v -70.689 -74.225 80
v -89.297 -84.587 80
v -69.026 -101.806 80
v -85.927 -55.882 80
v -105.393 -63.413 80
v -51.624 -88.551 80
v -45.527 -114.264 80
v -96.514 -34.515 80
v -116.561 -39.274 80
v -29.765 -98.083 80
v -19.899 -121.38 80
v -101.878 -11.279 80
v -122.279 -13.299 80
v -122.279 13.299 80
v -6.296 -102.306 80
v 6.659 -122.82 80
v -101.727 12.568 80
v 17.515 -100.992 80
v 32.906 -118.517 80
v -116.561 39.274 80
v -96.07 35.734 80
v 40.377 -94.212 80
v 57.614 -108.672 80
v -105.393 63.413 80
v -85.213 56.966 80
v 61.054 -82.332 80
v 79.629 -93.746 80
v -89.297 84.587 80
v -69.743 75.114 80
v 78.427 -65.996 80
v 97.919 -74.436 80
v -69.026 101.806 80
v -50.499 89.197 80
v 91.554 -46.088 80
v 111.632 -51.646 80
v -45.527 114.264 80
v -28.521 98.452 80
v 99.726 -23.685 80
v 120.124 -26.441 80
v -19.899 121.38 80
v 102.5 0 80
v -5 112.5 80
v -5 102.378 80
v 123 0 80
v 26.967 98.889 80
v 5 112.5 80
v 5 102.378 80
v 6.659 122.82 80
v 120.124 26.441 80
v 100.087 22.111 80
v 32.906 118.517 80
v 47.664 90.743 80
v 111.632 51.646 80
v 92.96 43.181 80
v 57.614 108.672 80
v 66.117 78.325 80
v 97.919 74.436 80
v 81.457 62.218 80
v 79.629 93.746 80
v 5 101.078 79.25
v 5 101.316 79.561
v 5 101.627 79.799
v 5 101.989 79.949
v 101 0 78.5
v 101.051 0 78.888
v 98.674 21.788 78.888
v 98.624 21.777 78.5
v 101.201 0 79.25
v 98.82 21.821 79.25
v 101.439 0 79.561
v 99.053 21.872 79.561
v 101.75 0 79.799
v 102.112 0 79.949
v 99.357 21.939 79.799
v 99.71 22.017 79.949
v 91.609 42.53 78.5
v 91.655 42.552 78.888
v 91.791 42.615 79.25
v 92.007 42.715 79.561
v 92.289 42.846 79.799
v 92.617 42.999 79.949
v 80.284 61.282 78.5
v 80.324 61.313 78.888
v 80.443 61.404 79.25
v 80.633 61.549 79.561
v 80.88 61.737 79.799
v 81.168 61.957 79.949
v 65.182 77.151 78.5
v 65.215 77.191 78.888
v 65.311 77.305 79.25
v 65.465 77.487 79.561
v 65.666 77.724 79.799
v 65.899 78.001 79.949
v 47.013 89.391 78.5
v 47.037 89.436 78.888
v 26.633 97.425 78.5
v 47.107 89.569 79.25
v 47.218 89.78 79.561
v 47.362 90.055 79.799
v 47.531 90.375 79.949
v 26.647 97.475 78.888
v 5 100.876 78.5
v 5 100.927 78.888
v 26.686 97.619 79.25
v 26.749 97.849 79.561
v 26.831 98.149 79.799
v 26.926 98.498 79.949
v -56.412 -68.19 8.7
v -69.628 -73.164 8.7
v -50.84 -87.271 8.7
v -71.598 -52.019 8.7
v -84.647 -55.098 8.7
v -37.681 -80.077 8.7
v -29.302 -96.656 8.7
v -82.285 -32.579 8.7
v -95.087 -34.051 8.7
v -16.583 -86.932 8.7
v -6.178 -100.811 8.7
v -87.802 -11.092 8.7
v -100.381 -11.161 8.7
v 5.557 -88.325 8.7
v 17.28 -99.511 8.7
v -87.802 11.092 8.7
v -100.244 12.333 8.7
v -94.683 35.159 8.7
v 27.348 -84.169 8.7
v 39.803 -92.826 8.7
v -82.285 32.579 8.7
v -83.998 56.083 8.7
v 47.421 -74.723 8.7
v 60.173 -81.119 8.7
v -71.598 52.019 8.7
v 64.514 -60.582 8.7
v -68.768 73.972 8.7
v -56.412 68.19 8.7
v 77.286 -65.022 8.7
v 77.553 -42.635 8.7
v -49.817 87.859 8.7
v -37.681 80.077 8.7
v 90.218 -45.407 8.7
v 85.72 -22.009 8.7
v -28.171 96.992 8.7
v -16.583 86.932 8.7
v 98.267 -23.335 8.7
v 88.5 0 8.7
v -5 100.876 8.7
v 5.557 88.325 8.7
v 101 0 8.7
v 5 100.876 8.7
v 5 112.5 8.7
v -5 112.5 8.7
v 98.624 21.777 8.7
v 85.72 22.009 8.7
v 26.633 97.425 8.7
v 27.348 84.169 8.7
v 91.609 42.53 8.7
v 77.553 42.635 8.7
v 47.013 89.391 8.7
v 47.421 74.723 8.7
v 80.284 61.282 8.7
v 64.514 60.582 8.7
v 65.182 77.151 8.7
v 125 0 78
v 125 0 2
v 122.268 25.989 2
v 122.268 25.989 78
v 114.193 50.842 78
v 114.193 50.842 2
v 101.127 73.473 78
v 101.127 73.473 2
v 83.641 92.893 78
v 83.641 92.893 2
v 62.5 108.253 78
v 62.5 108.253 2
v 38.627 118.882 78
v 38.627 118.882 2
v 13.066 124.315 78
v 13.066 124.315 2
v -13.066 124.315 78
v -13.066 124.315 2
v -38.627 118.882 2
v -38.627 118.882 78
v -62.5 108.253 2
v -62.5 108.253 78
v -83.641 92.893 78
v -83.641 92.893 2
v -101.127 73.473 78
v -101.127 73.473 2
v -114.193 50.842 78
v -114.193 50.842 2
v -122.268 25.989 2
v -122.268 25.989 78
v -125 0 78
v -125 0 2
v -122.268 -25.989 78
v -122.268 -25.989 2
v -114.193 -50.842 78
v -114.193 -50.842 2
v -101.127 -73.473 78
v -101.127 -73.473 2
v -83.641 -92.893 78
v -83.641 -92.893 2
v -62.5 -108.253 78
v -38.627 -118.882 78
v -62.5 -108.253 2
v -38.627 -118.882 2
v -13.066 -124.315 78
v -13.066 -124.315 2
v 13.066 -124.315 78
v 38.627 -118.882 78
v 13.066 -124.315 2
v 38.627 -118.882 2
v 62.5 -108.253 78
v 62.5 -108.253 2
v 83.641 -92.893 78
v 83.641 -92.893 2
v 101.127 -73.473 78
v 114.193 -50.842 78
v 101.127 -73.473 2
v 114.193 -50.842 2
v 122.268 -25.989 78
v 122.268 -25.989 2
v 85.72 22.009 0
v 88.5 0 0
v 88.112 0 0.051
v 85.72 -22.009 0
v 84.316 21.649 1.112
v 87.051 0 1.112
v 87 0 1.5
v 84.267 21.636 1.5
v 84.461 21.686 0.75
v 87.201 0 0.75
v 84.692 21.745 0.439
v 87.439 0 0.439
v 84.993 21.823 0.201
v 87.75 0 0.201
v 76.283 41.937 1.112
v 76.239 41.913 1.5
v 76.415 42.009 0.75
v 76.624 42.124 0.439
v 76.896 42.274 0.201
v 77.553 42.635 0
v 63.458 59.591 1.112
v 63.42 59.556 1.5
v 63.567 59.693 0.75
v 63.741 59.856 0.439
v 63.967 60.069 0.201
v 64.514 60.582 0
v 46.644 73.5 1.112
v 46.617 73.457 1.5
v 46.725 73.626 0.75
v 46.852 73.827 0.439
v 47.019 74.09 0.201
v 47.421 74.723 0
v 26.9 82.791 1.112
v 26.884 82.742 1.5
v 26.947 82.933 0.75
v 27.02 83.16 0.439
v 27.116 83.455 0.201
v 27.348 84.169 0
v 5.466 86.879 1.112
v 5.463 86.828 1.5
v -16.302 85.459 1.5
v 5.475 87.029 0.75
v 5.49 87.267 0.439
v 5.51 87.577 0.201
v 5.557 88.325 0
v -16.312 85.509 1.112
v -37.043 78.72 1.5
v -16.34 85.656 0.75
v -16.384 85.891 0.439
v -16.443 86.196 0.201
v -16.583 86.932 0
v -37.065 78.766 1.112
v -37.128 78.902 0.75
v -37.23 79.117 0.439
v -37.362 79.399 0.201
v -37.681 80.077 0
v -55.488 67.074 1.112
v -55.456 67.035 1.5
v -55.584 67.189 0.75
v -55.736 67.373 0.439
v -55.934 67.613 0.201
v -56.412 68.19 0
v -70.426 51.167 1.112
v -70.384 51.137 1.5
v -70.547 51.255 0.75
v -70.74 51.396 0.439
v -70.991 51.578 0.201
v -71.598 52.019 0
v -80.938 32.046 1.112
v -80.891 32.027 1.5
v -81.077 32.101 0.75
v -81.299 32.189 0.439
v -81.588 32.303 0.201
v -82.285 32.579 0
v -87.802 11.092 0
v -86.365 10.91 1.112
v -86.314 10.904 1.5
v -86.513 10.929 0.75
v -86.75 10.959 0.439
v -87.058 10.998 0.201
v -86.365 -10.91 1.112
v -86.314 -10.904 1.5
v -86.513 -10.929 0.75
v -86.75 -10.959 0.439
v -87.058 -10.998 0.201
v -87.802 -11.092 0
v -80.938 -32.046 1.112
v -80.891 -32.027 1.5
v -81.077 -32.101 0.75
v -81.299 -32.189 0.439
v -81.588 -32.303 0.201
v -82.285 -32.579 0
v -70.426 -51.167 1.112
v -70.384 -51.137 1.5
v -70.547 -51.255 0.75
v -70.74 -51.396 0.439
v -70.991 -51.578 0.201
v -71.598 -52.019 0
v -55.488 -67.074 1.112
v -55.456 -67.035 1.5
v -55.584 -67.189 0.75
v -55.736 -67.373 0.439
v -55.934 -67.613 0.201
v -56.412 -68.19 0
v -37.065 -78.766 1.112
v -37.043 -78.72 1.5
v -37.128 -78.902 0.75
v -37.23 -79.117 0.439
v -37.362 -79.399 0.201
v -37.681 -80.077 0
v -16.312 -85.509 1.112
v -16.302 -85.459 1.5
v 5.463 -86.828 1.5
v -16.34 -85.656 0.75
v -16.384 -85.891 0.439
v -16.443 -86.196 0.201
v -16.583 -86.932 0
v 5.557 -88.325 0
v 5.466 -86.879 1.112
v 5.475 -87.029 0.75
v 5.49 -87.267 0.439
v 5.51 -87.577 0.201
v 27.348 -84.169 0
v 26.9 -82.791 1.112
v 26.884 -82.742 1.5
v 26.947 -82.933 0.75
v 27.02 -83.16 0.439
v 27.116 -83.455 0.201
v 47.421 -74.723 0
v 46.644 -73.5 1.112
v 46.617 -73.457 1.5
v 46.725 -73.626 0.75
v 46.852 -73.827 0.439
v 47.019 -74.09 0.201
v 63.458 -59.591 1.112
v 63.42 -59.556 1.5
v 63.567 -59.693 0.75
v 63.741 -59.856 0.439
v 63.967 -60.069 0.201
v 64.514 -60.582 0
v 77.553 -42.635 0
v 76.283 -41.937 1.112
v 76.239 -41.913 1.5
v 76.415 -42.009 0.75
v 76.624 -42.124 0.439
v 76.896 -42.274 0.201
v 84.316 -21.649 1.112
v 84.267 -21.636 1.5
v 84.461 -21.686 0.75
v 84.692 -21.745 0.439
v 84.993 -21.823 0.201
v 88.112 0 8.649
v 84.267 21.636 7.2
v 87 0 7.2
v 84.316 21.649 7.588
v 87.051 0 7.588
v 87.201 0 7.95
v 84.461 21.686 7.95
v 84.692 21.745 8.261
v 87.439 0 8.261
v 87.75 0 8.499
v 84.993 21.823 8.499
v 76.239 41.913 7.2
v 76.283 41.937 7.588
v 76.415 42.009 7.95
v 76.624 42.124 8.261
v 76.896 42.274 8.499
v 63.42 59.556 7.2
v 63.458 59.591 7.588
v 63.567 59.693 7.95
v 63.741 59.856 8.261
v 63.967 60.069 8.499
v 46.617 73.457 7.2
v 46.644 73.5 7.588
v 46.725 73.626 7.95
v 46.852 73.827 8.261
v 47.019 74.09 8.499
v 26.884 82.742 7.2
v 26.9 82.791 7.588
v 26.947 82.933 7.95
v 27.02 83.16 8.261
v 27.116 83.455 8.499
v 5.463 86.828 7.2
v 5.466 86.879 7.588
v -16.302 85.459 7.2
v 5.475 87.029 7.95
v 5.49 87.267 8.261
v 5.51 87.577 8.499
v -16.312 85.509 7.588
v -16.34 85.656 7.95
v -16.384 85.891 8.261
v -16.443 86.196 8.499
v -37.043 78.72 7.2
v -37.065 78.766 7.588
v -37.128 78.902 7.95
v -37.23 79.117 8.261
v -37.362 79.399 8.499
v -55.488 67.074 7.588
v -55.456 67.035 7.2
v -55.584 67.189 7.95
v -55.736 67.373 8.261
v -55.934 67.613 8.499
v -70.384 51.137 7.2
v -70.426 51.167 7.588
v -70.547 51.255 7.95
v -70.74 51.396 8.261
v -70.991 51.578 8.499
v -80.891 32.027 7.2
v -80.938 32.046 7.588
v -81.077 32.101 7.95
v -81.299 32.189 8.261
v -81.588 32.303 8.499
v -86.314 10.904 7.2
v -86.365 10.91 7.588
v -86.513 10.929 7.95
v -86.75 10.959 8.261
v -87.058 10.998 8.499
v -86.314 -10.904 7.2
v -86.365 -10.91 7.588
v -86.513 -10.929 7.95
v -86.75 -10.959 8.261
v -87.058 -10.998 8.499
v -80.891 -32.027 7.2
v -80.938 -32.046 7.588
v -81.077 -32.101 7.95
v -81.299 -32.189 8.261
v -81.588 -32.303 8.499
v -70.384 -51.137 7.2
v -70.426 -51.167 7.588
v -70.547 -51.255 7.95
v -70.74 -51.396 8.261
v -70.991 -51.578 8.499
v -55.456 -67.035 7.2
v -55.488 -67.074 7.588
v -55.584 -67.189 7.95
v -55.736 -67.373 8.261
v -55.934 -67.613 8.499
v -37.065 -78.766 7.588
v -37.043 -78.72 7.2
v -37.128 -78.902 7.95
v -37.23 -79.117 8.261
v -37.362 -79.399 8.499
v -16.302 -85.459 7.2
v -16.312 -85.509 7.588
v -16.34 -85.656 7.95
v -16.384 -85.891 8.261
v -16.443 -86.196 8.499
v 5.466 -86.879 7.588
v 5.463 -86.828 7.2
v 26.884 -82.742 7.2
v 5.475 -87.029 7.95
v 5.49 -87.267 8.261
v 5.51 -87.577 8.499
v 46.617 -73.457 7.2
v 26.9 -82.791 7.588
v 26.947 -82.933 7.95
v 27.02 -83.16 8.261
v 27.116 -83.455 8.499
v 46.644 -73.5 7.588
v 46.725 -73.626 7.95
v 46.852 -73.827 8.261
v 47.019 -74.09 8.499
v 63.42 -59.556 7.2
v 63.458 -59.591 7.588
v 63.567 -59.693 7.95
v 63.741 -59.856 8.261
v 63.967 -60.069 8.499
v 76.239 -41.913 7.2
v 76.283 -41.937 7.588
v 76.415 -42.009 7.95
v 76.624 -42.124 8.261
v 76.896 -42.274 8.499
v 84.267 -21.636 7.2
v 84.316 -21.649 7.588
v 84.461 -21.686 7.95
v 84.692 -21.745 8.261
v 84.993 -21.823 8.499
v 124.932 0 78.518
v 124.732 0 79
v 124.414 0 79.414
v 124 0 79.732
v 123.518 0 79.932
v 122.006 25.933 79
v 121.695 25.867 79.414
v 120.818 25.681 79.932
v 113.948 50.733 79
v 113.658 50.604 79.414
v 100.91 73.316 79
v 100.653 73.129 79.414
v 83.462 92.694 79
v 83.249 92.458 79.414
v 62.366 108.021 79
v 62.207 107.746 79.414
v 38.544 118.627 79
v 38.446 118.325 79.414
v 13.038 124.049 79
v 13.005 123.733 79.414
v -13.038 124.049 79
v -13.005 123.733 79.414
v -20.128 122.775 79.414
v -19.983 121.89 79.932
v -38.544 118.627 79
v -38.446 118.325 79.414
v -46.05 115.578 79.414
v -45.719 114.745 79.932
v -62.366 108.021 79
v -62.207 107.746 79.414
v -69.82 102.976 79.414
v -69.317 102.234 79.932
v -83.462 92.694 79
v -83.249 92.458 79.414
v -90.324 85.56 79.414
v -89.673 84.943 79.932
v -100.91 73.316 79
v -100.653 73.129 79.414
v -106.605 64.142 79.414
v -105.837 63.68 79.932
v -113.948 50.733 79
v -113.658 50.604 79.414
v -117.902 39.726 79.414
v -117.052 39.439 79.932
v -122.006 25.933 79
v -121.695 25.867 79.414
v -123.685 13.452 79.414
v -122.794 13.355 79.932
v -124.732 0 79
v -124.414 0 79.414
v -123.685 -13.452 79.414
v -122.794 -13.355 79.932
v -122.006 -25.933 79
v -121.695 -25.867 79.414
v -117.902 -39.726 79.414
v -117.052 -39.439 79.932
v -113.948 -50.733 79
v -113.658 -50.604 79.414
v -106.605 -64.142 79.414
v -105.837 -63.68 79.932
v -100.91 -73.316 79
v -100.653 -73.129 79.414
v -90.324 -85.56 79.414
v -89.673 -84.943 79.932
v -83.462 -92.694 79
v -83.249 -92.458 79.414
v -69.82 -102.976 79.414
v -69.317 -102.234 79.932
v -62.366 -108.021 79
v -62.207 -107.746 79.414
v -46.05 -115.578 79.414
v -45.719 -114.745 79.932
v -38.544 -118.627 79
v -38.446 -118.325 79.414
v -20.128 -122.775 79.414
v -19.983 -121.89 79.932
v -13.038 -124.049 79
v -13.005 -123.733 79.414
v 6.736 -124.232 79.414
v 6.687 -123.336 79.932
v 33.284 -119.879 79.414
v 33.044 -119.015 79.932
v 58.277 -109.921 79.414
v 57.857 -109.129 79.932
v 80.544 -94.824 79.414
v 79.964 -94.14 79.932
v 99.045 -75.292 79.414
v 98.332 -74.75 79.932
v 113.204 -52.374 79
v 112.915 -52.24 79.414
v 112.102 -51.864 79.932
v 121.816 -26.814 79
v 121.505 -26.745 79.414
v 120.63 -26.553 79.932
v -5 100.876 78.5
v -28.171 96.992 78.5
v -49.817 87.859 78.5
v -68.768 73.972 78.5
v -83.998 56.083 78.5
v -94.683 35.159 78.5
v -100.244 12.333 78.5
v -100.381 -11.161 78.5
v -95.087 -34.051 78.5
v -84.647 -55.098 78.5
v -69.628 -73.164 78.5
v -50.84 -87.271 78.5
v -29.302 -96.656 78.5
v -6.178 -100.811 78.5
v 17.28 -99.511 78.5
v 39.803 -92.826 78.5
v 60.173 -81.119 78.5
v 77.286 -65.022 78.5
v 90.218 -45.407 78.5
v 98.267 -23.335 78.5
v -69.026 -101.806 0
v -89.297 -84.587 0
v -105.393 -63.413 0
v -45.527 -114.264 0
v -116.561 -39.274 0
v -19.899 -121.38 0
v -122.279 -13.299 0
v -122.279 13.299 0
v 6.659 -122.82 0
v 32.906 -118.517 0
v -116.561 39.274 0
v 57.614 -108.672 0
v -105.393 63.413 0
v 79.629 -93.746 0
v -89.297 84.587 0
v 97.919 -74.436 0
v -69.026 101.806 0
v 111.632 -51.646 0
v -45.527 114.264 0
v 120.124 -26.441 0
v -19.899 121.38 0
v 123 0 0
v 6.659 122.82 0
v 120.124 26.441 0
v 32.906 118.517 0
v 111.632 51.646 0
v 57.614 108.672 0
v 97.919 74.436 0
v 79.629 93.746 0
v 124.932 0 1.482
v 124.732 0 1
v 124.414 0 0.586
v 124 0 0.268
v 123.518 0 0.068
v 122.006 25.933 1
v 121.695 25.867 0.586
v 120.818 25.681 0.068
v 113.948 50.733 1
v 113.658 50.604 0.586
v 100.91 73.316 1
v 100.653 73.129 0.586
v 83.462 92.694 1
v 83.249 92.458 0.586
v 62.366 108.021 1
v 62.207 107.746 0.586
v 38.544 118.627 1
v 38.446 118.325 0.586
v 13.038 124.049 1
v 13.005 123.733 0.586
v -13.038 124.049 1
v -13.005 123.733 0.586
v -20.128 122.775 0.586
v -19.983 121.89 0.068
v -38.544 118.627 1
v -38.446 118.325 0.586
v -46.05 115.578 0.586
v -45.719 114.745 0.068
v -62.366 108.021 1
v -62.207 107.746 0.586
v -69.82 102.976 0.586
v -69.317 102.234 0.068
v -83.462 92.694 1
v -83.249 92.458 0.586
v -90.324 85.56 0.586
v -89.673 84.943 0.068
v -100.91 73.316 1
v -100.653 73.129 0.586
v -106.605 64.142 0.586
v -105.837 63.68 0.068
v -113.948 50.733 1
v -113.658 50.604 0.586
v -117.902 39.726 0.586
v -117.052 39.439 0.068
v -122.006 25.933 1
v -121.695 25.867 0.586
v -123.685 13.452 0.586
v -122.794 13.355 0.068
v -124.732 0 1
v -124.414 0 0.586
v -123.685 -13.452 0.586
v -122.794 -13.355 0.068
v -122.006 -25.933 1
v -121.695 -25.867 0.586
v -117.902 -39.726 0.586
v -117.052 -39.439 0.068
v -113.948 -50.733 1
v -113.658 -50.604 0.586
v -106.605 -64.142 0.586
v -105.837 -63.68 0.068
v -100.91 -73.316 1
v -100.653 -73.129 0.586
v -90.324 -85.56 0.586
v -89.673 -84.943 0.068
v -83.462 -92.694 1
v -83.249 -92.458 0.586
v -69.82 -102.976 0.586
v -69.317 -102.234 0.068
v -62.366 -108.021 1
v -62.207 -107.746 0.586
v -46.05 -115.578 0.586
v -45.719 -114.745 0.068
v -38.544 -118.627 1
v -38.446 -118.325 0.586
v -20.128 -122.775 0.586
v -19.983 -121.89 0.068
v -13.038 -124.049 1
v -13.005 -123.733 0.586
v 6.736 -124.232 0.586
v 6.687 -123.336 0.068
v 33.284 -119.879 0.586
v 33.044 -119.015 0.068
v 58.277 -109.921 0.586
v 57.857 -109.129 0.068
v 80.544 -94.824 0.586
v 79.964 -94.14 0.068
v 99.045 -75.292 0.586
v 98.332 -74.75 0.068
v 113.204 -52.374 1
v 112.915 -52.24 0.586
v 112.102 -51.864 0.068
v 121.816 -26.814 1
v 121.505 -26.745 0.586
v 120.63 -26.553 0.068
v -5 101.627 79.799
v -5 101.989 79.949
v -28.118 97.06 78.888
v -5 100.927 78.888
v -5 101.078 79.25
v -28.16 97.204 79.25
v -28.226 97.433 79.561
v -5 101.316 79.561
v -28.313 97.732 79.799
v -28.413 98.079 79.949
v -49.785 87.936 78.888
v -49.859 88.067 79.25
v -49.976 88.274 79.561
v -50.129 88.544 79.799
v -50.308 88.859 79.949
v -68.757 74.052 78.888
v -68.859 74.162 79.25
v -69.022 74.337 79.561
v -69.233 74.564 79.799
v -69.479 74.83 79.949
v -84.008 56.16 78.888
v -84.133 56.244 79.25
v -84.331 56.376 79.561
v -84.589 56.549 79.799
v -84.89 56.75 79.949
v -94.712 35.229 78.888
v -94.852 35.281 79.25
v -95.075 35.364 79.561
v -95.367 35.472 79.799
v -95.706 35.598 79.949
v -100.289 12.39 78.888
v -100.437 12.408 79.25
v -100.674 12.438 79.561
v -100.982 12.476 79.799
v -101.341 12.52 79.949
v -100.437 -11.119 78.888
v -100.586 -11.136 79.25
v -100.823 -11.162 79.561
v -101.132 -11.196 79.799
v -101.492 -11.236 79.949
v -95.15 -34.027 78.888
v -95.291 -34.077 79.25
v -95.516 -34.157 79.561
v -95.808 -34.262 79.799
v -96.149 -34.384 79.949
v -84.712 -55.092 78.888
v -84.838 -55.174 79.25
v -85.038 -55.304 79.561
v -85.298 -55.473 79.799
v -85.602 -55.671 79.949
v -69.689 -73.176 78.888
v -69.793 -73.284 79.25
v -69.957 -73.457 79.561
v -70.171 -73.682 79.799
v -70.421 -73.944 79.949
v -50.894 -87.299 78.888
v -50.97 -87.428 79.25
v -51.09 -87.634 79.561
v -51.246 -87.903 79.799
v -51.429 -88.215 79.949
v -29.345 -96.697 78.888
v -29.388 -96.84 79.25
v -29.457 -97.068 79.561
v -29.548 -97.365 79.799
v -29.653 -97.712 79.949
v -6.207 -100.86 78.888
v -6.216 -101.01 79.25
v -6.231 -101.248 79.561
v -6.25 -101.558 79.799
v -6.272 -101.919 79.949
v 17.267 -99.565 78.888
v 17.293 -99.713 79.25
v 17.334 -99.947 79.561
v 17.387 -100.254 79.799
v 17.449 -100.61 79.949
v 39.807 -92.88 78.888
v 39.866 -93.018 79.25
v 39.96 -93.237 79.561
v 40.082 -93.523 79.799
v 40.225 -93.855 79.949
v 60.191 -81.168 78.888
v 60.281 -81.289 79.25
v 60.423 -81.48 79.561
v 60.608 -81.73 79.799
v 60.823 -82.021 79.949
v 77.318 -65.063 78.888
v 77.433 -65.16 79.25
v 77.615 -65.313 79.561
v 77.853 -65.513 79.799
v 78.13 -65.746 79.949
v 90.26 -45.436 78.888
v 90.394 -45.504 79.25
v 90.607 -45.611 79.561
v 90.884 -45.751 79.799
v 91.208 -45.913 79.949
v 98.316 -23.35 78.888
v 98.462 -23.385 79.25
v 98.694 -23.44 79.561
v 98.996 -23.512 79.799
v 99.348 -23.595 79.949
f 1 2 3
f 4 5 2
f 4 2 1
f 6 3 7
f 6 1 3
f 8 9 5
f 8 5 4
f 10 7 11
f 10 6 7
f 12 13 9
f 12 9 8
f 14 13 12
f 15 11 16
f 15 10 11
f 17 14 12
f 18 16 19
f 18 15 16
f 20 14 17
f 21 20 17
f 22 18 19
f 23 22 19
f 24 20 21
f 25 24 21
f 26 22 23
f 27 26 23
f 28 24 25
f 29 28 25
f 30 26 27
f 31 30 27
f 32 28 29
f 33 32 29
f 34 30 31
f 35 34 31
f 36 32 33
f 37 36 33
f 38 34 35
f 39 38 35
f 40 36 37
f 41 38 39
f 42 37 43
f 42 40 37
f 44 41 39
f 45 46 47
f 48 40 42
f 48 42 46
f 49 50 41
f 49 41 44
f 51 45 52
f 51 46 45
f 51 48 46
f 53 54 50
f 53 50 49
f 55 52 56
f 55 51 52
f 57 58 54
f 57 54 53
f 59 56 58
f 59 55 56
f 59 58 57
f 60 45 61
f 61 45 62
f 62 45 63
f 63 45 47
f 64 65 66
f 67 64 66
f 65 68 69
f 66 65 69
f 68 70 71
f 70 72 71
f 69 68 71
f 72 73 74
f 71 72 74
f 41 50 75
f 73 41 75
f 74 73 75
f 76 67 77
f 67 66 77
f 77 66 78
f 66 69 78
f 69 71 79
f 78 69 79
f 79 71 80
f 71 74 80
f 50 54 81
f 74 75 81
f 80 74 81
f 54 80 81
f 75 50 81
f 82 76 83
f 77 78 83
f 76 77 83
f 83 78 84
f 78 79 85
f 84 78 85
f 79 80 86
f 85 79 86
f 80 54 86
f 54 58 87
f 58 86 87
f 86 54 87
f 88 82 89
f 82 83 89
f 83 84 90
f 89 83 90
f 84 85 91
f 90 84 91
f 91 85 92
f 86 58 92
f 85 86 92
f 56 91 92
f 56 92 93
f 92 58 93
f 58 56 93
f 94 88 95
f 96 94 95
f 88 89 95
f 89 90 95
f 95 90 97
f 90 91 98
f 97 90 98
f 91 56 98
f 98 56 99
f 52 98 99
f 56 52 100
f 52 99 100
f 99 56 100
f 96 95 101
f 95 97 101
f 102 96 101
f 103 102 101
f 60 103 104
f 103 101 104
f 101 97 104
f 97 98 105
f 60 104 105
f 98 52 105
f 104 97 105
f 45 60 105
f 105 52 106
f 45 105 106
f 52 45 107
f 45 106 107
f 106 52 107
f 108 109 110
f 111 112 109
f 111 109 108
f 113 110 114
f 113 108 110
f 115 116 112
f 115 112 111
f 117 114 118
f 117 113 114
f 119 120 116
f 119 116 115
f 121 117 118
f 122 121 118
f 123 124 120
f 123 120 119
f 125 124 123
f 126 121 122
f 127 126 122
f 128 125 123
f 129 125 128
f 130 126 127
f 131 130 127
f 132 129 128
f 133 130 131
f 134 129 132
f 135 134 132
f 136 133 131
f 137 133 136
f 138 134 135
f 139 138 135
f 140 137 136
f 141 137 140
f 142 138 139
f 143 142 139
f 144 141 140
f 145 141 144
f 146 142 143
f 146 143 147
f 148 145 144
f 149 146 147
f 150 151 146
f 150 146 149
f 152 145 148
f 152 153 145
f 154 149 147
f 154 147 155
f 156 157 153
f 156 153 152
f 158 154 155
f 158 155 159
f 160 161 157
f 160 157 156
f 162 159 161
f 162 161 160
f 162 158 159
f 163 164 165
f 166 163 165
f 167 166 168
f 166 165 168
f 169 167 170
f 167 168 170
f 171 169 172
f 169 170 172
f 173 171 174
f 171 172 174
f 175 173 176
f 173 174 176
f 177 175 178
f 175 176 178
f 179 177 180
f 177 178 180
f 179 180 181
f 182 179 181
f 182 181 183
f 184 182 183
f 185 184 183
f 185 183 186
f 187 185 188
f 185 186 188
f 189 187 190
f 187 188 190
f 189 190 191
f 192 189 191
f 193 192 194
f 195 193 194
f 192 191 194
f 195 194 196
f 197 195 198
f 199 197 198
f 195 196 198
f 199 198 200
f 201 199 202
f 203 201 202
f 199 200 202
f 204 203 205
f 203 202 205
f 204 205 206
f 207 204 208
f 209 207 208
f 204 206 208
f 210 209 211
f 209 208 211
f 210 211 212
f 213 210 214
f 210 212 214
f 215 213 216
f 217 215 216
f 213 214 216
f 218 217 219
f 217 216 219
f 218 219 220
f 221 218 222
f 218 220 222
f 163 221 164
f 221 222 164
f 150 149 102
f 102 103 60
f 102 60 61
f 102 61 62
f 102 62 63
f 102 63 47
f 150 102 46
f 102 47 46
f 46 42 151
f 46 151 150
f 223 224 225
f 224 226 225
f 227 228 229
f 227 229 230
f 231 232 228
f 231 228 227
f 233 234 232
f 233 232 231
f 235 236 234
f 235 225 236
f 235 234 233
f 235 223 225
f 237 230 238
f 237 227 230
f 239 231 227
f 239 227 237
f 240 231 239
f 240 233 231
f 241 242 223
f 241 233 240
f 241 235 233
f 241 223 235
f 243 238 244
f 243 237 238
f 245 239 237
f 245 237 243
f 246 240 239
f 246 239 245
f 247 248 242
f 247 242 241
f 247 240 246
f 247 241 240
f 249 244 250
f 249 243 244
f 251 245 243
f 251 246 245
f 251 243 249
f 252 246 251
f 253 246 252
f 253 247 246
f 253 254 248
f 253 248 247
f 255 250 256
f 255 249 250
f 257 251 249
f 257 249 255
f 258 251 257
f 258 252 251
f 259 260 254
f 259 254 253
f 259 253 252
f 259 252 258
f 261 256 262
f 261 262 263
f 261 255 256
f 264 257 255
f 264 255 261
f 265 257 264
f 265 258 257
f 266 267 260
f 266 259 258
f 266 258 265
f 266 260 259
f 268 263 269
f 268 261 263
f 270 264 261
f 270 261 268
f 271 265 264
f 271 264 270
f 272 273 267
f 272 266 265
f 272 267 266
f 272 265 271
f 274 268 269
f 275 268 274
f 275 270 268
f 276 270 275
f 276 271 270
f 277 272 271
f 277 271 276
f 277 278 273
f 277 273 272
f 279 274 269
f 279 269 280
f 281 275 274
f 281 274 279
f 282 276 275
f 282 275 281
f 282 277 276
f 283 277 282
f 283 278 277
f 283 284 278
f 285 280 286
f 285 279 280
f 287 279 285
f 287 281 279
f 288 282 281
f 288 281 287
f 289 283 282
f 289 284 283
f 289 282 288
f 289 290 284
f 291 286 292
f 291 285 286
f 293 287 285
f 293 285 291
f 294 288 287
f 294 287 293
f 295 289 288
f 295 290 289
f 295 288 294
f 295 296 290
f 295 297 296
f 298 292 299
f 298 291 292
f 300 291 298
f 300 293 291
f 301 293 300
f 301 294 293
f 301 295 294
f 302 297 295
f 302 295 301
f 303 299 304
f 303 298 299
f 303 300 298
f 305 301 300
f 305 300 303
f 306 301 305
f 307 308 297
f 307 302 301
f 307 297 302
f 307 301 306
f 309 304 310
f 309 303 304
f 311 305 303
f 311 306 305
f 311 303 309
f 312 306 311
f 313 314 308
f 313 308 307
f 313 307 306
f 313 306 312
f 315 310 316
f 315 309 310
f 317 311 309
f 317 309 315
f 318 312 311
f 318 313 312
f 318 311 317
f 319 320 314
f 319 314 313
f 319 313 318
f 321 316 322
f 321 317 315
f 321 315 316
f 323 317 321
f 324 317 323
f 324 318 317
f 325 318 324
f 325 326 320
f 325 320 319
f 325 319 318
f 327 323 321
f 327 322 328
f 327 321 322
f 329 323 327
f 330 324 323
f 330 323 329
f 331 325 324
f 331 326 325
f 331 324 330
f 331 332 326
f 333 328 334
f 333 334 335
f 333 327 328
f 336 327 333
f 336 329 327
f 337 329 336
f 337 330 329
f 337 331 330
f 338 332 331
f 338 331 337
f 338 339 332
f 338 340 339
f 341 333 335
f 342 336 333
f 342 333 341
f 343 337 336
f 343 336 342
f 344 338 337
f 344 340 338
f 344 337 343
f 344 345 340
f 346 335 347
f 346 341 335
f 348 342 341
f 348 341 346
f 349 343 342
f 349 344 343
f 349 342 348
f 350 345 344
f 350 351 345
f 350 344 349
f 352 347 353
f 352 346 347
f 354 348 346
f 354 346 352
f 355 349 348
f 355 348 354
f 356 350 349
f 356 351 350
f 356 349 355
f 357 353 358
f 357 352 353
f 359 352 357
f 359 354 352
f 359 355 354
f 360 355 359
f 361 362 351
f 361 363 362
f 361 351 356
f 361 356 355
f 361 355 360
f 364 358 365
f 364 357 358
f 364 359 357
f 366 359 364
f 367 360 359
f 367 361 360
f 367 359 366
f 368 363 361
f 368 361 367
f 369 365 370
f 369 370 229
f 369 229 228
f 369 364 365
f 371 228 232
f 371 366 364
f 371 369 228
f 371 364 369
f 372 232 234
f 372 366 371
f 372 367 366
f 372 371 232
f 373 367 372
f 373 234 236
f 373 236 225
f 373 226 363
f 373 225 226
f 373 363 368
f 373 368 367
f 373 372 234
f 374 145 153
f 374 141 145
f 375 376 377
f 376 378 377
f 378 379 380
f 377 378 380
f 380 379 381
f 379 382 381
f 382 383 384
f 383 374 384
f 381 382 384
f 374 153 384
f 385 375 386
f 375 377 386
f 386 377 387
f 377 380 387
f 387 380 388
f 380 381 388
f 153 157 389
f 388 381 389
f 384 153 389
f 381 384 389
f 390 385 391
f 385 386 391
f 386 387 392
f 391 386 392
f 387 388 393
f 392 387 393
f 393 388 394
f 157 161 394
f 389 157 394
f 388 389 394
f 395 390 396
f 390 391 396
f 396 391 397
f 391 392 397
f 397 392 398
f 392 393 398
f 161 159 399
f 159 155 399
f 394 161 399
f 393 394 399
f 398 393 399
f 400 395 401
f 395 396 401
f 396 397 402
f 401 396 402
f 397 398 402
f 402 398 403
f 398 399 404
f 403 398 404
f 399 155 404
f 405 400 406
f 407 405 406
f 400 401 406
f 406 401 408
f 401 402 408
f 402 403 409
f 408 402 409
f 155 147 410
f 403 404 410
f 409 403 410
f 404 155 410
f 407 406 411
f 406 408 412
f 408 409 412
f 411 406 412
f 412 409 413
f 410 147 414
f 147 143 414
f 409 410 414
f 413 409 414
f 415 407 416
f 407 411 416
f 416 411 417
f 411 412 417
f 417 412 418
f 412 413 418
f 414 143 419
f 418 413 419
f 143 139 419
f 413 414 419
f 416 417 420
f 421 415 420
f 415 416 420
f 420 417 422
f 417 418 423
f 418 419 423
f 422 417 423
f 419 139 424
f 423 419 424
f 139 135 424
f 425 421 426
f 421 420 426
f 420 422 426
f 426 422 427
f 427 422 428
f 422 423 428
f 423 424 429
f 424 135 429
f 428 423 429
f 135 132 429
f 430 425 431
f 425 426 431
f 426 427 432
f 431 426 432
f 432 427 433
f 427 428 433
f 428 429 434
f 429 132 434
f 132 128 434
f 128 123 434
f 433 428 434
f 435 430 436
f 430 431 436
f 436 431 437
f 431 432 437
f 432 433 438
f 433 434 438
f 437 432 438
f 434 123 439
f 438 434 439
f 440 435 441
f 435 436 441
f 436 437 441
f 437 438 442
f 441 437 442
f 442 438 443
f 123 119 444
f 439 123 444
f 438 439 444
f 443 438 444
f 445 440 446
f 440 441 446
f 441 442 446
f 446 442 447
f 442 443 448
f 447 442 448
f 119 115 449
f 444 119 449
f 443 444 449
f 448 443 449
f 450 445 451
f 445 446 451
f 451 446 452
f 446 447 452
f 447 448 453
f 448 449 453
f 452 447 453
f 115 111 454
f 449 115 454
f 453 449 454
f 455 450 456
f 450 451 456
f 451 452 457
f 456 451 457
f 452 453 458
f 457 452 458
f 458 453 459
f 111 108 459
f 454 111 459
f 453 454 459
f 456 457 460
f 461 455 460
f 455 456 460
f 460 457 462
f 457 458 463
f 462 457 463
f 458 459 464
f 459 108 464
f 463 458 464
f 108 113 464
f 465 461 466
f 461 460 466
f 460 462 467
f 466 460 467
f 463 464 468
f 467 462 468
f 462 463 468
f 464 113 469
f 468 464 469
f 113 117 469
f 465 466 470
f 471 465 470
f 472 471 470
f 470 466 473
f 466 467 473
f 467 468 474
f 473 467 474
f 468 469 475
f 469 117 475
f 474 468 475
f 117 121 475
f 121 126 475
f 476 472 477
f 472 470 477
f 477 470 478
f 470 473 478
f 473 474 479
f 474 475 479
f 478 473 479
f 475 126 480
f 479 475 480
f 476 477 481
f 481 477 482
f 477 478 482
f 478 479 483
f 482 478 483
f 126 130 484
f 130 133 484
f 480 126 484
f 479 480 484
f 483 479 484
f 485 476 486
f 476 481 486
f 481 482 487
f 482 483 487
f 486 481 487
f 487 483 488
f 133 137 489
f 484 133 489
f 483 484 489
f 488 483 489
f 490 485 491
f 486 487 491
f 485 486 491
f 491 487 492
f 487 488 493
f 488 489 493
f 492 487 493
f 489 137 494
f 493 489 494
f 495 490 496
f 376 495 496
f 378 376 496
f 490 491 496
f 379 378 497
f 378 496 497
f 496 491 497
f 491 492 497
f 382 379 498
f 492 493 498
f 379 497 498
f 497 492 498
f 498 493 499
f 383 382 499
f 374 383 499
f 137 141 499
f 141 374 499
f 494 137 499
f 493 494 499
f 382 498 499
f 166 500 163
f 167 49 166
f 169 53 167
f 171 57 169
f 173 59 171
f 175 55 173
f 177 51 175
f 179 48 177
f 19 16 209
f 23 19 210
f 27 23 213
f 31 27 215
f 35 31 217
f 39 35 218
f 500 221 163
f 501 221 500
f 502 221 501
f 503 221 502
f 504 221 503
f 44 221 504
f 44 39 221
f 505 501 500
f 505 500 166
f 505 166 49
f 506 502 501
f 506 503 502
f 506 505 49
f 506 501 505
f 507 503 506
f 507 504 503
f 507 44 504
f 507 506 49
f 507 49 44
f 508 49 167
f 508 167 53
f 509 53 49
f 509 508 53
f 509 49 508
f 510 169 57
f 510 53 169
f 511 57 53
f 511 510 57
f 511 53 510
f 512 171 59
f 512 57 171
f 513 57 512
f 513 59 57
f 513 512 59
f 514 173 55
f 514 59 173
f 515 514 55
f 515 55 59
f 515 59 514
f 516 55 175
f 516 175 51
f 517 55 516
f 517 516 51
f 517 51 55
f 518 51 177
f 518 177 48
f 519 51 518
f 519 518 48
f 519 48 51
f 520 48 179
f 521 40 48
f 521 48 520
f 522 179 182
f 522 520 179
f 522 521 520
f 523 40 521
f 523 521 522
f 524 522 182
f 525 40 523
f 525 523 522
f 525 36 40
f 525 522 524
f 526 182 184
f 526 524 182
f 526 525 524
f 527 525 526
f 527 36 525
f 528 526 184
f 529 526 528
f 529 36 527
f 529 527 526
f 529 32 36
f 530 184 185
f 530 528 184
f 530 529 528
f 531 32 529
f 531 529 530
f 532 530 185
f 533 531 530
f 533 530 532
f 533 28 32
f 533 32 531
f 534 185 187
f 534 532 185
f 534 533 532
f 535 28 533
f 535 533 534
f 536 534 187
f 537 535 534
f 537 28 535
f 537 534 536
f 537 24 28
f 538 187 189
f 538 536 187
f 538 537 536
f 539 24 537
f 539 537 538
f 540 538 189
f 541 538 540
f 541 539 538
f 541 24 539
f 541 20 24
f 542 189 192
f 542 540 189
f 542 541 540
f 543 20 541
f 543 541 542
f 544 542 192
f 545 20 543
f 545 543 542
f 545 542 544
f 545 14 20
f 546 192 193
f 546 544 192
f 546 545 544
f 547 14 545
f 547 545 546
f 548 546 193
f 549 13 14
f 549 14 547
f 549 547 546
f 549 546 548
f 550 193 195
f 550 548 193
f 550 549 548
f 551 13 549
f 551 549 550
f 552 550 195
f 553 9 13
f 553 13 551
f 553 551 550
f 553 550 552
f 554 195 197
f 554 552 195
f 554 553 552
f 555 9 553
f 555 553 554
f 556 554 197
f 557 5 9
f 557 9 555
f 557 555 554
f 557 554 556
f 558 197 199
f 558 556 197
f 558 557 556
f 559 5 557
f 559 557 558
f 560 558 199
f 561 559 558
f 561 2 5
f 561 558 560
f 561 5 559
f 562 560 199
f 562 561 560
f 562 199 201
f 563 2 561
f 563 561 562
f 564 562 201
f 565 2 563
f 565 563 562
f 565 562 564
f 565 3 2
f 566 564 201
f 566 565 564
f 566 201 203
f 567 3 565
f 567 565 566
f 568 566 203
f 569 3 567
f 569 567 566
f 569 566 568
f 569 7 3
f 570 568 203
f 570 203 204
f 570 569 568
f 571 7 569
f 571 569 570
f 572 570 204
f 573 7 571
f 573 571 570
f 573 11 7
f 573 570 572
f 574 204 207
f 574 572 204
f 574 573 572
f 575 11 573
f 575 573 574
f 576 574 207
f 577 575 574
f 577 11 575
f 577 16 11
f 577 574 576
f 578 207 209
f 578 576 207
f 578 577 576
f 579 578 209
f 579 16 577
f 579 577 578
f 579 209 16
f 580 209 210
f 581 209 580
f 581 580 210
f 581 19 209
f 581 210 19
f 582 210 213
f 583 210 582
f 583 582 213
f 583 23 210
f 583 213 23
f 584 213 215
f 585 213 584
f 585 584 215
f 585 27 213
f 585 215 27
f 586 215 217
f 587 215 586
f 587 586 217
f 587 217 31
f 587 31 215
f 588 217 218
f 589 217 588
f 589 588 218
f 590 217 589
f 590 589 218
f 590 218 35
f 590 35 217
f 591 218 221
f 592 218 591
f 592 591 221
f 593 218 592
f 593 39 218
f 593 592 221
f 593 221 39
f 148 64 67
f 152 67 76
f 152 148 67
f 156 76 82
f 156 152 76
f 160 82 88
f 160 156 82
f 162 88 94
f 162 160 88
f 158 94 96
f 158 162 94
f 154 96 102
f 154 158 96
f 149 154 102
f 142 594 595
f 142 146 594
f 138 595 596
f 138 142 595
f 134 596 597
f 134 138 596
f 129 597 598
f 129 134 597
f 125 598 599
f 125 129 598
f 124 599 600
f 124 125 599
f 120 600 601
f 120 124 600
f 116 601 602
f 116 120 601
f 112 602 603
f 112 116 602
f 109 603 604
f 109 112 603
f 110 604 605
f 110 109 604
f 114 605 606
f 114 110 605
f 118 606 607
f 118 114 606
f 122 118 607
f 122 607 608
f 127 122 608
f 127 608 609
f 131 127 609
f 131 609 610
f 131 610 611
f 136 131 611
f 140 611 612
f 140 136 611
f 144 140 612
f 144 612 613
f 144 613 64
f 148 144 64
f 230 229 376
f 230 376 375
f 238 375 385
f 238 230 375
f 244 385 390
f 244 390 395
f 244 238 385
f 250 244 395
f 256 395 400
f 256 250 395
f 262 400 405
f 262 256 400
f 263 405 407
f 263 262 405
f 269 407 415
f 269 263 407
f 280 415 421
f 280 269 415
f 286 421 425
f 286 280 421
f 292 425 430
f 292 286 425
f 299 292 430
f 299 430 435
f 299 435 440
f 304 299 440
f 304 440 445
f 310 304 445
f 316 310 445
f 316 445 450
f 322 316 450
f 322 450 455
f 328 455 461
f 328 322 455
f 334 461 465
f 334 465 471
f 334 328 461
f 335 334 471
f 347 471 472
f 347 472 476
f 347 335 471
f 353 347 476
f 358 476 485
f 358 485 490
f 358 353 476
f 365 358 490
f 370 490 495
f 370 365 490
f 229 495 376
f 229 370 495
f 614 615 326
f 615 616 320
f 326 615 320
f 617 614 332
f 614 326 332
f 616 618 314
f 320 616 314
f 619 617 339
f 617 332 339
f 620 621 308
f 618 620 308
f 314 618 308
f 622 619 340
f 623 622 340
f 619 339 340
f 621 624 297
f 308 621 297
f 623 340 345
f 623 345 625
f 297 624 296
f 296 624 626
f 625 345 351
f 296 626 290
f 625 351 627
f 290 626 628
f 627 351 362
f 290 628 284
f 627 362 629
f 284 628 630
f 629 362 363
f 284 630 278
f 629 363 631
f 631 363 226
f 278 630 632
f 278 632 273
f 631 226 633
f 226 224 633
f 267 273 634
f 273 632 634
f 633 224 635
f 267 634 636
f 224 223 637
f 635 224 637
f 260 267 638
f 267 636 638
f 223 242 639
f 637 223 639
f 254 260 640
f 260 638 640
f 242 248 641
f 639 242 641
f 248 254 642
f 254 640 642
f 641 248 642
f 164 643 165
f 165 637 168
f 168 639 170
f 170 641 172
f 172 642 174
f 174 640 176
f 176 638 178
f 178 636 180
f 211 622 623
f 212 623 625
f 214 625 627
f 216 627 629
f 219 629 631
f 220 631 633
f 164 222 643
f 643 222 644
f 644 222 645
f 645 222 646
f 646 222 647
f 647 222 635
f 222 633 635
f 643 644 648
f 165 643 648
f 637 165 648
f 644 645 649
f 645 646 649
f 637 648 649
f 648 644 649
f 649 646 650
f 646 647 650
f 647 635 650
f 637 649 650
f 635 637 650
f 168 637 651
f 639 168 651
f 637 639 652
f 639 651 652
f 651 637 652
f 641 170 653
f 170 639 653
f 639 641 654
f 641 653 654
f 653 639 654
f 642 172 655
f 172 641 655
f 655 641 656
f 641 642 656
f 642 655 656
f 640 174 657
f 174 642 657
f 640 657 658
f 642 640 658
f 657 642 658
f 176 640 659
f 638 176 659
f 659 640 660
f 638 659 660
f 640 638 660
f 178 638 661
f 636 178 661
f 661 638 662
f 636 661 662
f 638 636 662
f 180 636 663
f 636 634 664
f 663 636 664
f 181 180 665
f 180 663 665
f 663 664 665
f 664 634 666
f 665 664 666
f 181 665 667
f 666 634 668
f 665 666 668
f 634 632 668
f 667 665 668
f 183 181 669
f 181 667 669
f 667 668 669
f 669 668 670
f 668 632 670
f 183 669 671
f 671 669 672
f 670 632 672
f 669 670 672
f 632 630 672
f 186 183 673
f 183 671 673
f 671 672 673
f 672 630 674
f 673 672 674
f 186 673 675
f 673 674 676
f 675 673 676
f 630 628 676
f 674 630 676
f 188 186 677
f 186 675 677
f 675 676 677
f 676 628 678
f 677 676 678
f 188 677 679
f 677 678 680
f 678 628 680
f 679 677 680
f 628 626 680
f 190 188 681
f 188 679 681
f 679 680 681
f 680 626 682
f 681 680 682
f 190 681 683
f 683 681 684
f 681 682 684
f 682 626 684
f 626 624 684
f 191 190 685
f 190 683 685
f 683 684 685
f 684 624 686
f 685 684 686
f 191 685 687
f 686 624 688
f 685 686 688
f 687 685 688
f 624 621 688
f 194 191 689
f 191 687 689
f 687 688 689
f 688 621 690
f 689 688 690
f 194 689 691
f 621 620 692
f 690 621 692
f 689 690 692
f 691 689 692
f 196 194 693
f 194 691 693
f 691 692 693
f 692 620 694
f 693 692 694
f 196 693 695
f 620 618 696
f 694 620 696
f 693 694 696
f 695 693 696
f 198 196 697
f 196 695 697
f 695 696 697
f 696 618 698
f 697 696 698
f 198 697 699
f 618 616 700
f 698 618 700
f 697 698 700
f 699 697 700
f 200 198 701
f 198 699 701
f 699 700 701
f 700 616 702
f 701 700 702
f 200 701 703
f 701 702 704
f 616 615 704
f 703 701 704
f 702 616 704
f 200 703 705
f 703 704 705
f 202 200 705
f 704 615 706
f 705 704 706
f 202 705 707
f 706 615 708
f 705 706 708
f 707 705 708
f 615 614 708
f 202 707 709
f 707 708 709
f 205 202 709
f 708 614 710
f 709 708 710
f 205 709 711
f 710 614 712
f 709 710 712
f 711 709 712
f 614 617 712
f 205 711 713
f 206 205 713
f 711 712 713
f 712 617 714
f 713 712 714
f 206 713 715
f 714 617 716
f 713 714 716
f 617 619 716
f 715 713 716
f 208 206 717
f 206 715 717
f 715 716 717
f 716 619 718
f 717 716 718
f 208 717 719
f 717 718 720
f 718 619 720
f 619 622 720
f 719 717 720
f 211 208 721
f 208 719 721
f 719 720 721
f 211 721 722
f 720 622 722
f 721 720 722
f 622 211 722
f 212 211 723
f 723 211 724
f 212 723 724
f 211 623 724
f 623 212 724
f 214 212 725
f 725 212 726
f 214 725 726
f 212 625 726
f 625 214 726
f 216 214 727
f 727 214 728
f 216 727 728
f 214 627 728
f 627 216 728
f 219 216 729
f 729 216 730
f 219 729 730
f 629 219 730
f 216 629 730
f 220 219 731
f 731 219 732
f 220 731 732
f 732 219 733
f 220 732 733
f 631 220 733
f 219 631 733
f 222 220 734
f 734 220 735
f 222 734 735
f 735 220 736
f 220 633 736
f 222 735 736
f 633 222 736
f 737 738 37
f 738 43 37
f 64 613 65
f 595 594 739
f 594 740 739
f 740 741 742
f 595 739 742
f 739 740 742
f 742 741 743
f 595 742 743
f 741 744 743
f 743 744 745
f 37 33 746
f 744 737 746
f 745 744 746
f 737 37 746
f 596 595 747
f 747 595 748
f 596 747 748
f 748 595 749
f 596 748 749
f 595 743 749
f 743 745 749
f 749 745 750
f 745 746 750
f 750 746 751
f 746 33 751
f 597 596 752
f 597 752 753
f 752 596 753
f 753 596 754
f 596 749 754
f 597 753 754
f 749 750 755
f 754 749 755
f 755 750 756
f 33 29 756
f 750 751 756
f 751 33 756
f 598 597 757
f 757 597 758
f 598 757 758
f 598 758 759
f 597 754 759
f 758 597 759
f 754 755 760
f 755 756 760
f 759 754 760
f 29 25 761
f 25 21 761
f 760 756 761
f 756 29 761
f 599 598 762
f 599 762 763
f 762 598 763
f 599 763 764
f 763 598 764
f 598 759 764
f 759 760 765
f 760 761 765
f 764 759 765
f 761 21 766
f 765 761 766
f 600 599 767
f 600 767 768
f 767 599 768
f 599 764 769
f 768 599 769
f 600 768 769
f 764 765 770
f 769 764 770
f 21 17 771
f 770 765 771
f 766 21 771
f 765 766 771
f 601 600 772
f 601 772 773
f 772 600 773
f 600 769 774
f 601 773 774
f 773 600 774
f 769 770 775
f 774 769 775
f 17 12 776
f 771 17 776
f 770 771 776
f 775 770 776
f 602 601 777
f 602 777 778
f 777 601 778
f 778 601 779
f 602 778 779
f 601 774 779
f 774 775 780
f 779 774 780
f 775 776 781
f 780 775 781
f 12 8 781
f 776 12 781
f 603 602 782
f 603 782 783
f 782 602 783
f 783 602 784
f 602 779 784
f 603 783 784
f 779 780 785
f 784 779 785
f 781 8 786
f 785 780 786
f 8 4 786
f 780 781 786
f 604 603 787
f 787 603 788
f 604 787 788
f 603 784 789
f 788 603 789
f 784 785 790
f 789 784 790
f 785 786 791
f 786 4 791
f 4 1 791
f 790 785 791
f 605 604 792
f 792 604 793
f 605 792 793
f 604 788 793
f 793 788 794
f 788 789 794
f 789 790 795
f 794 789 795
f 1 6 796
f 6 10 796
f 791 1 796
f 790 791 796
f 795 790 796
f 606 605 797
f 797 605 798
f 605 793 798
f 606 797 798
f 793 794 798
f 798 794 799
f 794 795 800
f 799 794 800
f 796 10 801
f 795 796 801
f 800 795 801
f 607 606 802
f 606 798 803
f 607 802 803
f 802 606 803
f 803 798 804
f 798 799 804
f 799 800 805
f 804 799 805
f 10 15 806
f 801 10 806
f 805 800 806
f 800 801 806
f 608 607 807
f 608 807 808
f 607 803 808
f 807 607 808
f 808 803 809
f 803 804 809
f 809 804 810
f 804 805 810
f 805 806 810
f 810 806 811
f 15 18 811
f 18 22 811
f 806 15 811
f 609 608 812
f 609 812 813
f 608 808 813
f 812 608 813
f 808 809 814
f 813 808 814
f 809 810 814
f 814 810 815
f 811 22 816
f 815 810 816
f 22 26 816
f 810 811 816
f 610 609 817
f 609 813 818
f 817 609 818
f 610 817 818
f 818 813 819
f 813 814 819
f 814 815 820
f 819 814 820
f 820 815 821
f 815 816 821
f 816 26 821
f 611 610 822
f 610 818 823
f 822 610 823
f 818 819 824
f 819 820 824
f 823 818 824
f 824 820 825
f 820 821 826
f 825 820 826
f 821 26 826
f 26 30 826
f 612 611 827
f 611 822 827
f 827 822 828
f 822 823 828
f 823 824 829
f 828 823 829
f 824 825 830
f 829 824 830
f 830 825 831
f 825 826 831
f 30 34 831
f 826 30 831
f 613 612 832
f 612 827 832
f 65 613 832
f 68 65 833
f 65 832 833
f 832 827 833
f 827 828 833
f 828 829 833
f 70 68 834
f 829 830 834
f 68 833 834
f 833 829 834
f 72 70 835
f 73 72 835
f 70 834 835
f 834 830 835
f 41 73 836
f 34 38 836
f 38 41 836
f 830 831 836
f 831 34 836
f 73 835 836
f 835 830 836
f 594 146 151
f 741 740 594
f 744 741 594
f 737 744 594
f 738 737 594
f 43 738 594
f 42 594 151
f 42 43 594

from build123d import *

# Parameters (mm, degrees)
SCHIZZO1_R                   = 125
SCHIZZO1_R_2                 = 101
ESTRUSIONE_ESTRUSIONE1_DEPTH = 80
RACCORDO1_R                  = 2
SCHIZZO3_R                   = 101
SCHIZZO3_R_2                 = 87
ESTRUSIONE_ESTRUSIONE2_DEPTH = 8.7
RACCORDO2_R                  = 1.5
SCHIZZO14_W                  = 10
SCHIZZO14_H                  = 35
TAGLIO_ESTRUSIONE1_DEPTH     = 71.3


with BuildPart() as part:
    # Schizzo1 → Estrusione-Estrusione1 (new body)
    with BuildSketch(Plane.XY):
        Circle(SCHIZZO1_R)
        Circle(SCHIZZO1_R_2, mode=Mode.SUBTRACT)
    extrude(amount=ESTRUSIONE_ESTRUSIONE1_DEPTH)

    # Raccordo1
    raccordo1_edges = [part.edges().sort_by_distance(p)[0] for p in [
        (-125, 0, 0),
        (-125, 0, 80),
    ]]
    fillet(raccordo1_edges, radius=RACCORDO1_R)

    # Schizzo3 → Estrusione-Estrusione2 (add)
    with BuildSketch(Plane.XY):
        Circle(SCHIZZO3_R)
        Circle(SCHIZZO3_R_2, mode=Mode.SUBTRACT)
    extrude(amount=ESTRUSIONE_ESTRUSIONE2_DEPTH)

    # Raccordo2
    raccordo2_edges = [part.edges().sort_by_distance(p)[0] for p in [
        (-87, 0, 0),
        (-87, 0, 8.7),
        (-101, 0, 80),
    ]]
    fillet(raccordo2_edges, radius=RACCORDO2_R)

    # Schizzo14 → Taglio-Estrusione1 (cut)
    with BuildSketch(Plane.XY.offset(80)):
        with Locations((0, 95)):
            Rectangle(SCHIZZO14_W, SCHIZZO14_H)
    extrude(amount=-TAGLIO_ESTRUSIONE1_DEPTH, mode=Mode.SUBTRACT)


solid = part.part
